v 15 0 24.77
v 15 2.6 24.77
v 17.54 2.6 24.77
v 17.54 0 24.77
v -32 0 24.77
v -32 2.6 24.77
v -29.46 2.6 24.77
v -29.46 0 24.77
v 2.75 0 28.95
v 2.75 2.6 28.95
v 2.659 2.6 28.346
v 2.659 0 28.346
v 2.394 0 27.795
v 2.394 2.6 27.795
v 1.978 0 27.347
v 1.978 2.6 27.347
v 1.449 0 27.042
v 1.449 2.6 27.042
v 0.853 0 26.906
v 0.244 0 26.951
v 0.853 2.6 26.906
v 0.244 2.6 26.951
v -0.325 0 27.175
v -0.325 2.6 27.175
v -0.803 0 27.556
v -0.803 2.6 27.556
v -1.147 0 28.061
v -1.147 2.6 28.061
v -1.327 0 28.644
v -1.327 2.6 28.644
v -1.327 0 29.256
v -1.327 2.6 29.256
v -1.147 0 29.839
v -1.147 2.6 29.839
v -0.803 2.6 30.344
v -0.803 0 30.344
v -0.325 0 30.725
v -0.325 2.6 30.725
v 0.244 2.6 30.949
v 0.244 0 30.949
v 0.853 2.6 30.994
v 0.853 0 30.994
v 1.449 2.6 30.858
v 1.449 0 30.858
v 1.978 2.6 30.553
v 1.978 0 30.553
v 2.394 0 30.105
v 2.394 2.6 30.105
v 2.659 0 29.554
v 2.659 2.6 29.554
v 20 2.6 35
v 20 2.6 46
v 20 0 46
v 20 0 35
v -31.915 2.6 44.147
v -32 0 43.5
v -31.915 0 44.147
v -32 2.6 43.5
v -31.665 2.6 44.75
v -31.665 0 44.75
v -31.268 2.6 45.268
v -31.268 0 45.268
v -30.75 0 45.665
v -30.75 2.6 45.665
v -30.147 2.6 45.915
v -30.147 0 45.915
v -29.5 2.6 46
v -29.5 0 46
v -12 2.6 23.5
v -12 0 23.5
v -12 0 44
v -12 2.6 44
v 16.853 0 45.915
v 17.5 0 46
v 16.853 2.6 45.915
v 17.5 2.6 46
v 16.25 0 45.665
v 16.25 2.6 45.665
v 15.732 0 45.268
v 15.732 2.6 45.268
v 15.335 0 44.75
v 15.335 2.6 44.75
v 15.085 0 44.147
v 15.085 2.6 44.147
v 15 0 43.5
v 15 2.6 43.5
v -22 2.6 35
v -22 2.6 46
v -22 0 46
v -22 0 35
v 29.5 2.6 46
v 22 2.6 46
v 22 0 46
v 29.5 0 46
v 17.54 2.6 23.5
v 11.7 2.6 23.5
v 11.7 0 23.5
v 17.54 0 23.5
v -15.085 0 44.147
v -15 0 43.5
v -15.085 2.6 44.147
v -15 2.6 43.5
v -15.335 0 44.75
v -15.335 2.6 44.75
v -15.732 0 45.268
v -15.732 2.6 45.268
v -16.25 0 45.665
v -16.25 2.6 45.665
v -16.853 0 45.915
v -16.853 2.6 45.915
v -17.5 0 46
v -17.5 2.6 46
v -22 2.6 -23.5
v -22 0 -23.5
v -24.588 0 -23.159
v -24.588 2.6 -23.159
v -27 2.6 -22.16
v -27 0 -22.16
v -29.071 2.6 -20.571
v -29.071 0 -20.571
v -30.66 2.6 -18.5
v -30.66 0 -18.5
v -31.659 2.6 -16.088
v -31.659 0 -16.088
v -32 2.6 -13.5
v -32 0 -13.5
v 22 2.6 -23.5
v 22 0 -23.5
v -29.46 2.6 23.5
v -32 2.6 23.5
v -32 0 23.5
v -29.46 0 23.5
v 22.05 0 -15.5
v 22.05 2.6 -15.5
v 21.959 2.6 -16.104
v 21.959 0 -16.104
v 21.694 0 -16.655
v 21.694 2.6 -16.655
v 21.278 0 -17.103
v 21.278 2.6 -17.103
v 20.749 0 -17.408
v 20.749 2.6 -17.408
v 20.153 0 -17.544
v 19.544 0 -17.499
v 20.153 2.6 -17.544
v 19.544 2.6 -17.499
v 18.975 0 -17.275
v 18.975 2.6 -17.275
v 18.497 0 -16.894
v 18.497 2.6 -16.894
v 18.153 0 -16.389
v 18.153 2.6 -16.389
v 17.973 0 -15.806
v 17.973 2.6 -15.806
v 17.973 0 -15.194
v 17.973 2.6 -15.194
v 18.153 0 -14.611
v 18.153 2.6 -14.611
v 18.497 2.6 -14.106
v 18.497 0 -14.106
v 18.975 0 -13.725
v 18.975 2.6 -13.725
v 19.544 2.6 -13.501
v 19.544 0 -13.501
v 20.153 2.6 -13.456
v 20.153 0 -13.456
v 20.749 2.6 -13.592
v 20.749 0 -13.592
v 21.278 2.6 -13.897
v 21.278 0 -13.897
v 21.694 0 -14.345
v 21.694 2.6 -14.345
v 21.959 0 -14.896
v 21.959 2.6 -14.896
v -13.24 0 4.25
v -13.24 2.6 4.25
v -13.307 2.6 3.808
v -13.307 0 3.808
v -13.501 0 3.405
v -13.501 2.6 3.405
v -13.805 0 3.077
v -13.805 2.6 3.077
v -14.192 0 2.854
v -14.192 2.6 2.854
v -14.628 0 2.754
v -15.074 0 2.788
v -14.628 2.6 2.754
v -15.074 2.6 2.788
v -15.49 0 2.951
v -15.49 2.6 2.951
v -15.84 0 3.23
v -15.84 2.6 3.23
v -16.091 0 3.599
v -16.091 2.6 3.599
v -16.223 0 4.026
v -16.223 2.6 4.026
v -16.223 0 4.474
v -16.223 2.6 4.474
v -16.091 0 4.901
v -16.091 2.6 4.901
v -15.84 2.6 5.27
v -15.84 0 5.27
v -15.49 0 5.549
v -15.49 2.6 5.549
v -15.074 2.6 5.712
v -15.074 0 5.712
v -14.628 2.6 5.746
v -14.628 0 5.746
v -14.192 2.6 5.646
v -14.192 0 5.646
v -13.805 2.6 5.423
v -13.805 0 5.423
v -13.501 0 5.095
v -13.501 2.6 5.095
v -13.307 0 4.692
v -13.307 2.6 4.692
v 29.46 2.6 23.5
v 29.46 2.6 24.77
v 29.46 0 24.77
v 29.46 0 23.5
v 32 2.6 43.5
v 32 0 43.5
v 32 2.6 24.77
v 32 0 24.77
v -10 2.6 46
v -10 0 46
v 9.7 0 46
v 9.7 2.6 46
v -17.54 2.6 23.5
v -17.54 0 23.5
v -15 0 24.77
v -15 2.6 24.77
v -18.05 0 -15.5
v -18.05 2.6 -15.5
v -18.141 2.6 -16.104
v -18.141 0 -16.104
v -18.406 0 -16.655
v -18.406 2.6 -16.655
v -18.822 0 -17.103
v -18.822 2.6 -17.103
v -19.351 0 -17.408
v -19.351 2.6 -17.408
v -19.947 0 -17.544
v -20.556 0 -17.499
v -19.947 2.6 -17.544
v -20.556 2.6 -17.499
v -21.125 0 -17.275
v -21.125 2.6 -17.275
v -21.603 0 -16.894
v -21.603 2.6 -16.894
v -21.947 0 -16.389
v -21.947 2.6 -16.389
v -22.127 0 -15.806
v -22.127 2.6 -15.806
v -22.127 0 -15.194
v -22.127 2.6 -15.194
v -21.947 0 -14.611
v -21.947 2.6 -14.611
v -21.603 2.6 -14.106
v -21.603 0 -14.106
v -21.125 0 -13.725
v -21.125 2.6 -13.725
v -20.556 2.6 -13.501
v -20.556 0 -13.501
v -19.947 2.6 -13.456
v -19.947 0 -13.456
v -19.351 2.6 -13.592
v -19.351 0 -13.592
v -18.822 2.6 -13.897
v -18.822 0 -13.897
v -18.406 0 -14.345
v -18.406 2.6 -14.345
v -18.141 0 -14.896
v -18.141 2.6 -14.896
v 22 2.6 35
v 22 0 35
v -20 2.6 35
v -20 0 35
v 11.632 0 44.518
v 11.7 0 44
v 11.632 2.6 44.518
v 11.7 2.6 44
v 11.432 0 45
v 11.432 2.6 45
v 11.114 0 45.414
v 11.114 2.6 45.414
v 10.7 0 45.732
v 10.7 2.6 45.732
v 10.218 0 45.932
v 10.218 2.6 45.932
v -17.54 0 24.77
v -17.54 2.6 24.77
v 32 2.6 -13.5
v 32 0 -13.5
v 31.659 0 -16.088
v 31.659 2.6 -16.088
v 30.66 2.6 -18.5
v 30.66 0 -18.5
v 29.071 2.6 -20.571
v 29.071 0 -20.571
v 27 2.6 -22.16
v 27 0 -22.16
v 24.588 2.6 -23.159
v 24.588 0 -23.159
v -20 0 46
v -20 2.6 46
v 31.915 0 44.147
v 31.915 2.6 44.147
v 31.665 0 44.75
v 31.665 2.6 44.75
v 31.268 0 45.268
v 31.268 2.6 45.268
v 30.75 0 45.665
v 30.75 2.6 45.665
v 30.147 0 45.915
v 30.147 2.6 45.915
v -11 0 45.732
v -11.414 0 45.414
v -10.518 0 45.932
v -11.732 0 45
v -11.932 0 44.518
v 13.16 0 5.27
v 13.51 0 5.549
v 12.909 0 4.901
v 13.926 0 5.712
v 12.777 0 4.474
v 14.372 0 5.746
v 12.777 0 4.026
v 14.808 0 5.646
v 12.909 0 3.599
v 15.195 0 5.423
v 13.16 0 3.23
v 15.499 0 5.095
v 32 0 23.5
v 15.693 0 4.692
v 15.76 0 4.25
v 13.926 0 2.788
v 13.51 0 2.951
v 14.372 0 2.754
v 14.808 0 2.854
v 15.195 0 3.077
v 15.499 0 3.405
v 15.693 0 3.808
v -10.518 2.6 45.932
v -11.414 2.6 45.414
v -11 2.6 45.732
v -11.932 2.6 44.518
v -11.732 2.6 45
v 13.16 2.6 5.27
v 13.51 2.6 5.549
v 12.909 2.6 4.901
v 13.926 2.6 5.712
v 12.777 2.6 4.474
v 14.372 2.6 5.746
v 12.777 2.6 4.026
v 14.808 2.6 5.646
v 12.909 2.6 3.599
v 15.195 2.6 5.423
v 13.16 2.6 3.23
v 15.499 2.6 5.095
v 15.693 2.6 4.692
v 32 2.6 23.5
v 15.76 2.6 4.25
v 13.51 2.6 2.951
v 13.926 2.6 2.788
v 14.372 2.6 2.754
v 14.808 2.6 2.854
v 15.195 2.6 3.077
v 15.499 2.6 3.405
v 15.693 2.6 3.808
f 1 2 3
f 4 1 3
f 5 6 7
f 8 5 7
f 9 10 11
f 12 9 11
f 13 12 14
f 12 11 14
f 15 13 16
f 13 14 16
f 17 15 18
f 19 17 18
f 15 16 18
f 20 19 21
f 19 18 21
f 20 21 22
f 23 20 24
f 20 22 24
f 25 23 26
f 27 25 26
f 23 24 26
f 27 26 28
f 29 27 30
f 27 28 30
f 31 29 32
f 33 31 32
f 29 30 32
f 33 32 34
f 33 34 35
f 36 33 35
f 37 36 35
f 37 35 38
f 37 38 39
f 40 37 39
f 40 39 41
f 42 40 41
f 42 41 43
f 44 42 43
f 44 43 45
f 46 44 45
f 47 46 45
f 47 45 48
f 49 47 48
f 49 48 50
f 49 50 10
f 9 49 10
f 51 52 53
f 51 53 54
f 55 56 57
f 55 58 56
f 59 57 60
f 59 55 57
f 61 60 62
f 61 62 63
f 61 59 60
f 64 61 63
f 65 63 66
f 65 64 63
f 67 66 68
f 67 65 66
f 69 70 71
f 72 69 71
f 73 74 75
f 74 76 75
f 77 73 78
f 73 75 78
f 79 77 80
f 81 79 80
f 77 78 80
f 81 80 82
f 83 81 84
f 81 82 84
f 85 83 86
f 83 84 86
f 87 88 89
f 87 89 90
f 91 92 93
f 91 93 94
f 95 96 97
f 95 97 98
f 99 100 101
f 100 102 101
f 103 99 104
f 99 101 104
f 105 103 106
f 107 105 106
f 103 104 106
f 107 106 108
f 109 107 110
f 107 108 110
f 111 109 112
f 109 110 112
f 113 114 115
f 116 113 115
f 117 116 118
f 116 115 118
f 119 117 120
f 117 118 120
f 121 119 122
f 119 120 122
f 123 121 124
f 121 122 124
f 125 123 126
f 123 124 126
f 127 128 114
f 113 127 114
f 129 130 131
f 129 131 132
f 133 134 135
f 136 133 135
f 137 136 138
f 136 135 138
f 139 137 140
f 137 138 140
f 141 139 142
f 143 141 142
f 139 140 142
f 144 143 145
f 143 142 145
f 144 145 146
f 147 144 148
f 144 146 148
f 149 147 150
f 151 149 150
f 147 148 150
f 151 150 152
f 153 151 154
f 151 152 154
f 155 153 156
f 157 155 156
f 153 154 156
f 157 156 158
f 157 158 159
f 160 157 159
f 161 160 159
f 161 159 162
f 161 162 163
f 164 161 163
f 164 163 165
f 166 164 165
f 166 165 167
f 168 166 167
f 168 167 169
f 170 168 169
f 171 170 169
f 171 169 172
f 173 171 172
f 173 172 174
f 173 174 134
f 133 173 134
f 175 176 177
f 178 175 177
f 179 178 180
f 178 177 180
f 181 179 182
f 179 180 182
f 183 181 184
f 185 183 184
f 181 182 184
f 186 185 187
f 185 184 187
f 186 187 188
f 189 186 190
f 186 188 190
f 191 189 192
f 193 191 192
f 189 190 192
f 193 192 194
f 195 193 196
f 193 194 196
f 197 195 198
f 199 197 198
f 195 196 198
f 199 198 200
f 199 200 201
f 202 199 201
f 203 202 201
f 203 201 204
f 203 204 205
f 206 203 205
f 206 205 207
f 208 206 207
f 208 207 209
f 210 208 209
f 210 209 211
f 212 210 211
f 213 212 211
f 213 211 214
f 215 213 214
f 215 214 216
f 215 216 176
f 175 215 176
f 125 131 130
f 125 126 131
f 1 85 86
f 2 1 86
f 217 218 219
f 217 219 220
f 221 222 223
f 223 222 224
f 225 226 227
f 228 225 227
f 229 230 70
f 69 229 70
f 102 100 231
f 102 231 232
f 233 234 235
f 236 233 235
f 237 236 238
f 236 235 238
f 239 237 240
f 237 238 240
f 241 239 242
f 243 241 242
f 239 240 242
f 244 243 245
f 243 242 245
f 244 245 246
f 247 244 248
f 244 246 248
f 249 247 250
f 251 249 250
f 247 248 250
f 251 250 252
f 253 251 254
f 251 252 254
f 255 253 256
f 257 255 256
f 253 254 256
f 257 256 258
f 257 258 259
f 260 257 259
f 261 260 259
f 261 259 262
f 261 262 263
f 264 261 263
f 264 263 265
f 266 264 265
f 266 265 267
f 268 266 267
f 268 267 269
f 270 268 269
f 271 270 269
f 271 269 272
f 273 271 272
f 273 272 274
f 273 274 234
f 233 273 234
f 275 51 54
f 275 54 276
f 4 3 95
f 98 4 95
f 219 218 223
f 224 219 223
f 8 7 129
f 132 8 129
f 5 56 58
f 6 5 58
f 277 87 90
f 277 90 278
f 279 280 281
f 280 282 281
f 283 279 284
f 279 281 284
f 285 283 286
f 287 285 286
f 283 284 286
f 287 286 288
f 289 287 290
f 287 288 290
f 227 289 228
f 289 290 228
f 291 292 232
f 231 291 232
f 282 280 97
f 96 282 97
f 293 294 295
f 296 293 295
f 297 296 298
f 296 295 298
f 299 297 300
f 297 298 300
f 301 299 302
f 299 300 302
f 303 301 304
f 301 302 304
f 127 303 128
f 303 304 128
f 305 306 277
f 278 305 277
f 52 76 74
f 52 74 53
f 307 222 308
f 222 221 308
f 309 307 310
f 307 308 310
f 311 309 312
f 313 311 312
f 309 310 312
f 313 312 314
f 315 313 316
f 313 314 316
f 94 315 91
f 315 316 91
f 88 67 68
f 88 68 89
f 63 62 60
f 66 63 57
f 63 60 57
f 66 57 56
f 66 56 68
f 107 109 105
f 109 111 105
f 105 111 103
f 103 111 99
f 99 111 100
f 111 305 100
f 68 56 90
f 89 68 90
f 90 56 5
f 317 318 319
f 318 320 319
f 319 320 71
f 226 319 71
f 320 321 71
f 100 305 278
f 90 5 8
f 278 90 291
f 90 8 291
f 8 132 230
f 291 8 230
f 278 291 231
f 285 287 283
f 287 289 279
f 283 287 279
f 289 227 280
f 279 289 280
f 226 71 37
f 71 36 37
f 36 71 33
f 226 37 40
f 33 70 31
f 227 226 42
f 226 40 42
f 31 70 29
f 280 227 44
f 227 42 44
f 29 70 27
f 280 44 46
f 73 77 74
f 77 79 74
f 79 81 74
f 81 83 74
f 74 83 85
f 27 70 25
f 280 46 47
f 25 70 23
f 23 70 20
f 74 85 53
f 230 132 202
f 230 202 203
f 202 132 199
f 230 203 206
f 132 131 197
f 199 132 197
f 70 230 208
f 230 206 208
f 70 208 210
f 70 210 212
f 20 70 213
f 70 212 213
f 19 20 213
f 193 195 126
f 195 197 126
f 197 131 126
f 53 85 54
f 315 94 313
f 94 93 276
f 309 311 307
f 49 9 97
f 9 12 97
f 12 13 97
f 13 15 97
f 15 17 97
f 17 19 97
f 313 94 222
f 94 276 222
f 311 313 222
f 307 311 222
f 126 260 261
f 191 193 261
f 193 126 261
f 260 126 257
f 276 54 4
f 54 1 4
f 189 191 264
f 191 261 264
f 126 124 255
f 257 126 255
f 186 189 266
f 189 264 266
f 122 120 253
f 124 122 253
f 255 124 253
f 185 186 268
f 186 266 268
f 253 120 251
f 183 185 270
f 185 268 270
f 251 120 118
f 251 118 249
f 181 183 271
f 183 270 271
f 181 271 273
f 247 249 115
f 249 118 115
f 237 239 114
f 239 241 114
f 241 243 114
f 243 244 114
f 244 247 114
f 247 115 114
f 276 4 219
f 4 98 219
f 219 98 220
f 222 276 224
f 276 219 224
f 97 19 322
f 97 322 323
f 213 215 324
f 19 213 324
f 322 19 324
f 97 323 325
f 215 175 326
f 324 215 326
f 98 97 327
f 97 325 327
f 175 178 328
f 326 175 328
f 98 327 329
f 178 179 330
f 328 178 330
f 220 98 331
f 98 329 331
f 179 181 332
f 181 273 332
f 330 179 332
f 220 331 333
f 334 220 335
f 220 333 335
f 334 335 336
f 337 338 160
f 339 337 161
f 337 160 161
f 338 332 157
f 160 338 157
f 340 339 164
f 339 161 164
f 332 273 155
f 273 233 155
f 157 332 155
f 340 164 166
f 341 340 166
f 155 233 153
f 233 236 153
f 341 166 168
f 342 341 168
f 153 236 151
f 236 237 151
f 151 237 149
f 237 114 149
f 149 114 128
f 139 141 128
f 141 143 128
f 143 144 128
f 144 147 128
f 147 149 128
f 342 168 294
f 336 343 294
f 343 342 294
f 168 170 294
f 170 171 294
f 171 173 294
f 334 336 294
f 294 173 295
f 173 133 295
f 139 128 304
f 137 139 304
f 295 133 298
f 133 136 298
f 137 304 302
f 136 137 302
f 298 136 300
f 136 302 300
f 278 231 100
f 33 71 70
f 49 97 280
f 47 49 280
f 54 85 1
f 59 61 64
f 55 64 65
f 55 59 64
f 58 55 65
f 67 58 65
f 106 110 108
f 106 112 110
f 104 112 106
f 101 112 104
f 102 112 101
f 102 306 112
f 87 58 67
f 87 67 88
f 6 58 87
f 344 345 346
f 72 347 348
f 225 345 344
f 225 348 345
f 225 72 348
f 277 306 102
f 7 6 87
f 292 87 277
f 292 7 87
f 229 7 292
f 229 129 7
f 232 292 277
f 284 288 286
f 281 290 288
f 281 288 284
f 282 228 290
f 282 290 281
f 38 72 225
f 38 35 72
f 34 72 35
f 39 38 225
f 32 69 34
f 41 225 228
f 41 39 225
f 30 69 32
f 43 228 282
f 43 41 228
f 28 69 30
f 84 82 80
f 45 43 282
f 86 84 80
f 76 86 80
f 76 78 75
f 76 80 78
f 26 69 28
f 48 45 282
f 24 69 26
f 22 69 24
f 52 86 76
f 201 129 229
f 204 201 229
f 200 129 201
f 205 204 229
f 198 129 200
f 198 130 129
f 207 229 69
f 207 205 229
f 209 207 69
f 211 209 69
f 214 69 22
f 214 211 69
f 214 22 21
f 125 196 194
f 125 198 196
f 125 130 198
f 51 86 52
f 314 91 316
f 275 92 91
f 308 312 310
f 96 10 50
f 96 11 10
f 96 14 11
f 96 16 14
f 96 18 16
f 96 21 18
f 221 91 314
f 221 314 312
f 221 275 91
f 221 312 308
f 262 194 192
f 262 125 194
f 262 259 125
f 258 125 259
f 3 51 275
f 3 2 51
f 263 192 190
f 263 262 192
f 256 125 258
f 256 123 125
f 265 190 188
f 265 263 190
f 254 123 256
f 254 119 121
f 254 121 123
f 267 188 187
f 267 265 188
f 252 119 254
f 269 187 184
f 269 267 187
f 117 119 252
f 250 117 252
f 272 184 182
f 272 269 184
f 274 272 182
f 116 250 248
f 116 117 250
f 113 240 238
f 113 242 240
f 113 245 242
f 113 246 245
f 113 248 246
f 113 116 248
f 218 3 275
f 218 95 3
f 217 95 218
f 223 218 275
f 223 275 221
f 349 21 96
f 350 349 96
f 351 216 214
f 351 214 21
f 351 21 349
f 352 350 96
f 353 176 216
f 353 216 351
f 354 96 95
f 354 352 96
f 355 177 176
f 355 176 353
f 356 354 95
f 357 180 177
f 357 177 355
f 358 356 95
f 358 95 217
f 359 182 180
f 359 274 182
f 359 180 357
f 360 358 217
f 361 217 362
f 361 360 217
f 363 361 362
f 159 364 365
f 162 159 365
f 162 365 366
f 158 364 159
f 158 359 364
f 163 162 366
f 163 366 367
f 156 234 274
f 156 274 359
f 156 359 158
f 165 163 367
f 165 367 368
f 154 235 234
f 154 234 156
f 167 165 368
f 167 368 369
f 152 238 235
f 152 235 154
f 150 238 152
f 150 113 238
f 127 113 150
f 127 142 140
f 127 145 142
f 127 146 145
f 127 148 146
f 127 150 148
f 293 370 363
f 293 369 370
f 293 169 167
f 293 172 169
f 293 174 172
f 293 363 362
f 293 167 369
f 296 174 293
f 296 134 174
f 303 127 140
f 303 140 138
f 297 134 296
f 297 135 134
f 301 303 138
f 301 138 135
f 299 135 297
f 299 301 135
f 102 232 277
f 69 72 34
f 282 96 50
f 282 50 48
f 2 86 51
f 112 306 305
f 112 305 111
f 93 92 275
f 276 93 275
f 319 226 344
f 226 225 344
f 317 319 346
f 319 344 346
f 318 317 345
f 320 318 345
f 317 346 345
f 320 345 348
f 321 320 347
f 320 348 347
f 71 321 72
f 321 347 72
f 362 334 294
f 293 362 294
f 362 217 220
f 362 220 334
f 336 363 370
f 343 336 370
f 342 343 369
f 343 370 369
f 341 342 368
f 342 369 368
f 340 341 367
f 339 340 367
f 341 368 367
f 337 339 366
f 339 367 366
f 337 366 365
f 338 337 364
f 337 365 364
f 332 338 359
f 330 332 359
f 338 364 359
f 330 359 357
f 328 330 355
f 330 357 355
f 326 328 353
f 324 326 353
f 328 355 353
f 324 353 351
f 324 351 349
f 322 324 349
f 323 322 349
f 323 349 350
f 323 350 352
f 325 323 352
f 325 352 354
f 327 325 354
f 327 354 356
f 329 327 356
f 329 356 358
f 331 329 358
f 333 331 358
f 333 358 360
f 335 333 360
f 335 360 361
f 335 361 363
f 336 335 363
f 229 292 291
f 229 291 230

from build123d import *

# Parameters (mm, degrees)
MAIN_BODY_DEPTH          = 2.6
SKETCH2_R                = 2.05
SKETCH2_R_2              = 1.5
SKETCH2_R_3              = 2.0499959
SCREW_HOLES_DEPTH        = 1
SCREW_HOLES_DEPTH_BACK   = 3.6
MAIN_LOWER_BODY_FILLET_R = 2
SKETCH5_W                = 17
SKETCH5_H                = 2.6
BOSS_EXTRUDE1_DEPTH      = 22.5
SKETCH6_W                = 2
SKETCH6_H                = 11
CUT_EXTRUDE1_DEPTH       = 22.5
FILLET2_R                = 2.5
SKETCH7_W                = 2.54
SKETCH7_H                = 1.27
CUT_EXTRUDE2_DEPTH       = 3.6


with BuildPart() as part:
    # Sketch1 → Main Body (new body)
    with BuildSketch(Plane(origin=(0, 0, 0), x_dir=(1, 0, 0), z_dir=(0, 1, 0))):
        with BuildLine():
            Line((11.7, -23.5), (32, -23.5))
            Line((32, -23.5), (32, 13.5))
            ThreePointArc((32, 13.5), (29.071067812, 20.571067812), (22, 23.5))
            Line((22, 23.5), (-22, 23.5))
            ThreePointArc((-22, 23.5), (-29.071067812, 20.571067812), (-32, 13.5))
            Line((-32, 13.5), (-32, -23.5))
            Line((-32, -23.5), (-12, -23.5))
            Line((-12, -23.5), (-12, -46))
            Line((-12, -46), (11.7, -46))
            Line((11.7, -46), (11.7, -23.5))
        make_face()
    extrude(amount=MAIN_BODY_DEPTH)

    # Sketch2 → Screw holes (cut, two sides)
    with BuildSketch(Plane(origin=(0, 2.6, 0), x_dir=(1, 0, 0), z_dir=(0, 1, 0))) as screw_holes_sk:
        with Locations((-20.1, 15.4999906)):
            Circle(SKETCH2_R)
        with Locations((20, 15.5)):
            Circle(SKETCH2_R)
        with Locations((-14.740009048, -4.250005346)):
            Circle(SKETCH2_R_2)
        with Locations((14.259990952, -4.250005346)):
            Circle(SKETCH2_R_2)
        with Locations((0.7, -28.9500094)):
            Circle(SKETCH2_R_3)
    extrude(amount=SCREW_HOLES_DEPTH, mode=Mode.SUBTRACT)
    extrude(screw_holes_sk.sketch, amount=-SCREW_HOLES_DEPTH_BACK, mode=Mode.SUBTRACT)

    # Main lower body Fillet
    main_lower_body_fillet_edges = [part.edges().sort_by_distance(p)[0] for p in [
        (11.7, 1.3, 46),
        (-12, 1.3, 46),
    ]]
    fillet(main_lower_body_fillet_edges, radius=MAIN_LOWER_BODY_FILLET_R)

    # Sketch5 → Boss-Extrude1 (add)
    with BuildSketch(Plane.XY.offset(23.5)):
        with Locations((-23.5, 1.3)):
            Rectangle(SKETCH5_W, SKETCH5_H)
        with Locations((23.5, 1.3)):
            Rectangle(SKETCH5_W, SKETCH5_H)
    extrude(amount=BOSS_EXTRUDE1_DEPTH)

    # Sketch6 → Cut-Extrude1 (cut)
    with BuildSketch(Plane(origin=(0, 2.6, 0), x_dir=(1, 0, 0), z_dir=(0, 1, 0))):
        with Locations((-21, -40.5)):
            Rectangle(SKETCH6_W, SKETCH6_H)
        with Locations((21, -40.5)):
            Rectangle(SKETCH6_W, SKETCH6_H)
    extrude(amount=-CUT_EXTRUDE1_DEPTH, mode=Mode.SUBTRACT)

    # Fillet2
    fillet2_edges = [part.edges().sort_by_distance(p)[0] for p in [
        (-32, 1.3, 46),
        (-15, 1.3, 46),
        (32, 1.3, 46),
        (15, 1.3, 46),
    ]]
    fillet(fillet2_edges, radius=FILLET2_R)

    # Sketch7 → Cut-Extrude2 (cut, through all)
    with BuildSketch(Plane(origin=(0, 2.6, 0), x_dir=(1, 0, 0), z_dir=(0, 1, 0))):
        with Locations((-30.73, -24.135)):
            Rectangle(SKETCH7_W, SKETCH7_H)
        with Locations((30.73, -24.135)):
            Rectangle(SKETCH7_W, SKETCH7_H)
        with Locations((-16.27, -24.135)):
            Rectangle(SKETCH7_W, SKETCH7_H)
        with Locations((16.27, -24.135)):
            Rectangle(SKETCH7_W, SKETCH7_H)
    extrude(amount=-CUT_EXTRUDE2_DEPTH, mode=Mode.SUBTRACT)


solid = part.part
